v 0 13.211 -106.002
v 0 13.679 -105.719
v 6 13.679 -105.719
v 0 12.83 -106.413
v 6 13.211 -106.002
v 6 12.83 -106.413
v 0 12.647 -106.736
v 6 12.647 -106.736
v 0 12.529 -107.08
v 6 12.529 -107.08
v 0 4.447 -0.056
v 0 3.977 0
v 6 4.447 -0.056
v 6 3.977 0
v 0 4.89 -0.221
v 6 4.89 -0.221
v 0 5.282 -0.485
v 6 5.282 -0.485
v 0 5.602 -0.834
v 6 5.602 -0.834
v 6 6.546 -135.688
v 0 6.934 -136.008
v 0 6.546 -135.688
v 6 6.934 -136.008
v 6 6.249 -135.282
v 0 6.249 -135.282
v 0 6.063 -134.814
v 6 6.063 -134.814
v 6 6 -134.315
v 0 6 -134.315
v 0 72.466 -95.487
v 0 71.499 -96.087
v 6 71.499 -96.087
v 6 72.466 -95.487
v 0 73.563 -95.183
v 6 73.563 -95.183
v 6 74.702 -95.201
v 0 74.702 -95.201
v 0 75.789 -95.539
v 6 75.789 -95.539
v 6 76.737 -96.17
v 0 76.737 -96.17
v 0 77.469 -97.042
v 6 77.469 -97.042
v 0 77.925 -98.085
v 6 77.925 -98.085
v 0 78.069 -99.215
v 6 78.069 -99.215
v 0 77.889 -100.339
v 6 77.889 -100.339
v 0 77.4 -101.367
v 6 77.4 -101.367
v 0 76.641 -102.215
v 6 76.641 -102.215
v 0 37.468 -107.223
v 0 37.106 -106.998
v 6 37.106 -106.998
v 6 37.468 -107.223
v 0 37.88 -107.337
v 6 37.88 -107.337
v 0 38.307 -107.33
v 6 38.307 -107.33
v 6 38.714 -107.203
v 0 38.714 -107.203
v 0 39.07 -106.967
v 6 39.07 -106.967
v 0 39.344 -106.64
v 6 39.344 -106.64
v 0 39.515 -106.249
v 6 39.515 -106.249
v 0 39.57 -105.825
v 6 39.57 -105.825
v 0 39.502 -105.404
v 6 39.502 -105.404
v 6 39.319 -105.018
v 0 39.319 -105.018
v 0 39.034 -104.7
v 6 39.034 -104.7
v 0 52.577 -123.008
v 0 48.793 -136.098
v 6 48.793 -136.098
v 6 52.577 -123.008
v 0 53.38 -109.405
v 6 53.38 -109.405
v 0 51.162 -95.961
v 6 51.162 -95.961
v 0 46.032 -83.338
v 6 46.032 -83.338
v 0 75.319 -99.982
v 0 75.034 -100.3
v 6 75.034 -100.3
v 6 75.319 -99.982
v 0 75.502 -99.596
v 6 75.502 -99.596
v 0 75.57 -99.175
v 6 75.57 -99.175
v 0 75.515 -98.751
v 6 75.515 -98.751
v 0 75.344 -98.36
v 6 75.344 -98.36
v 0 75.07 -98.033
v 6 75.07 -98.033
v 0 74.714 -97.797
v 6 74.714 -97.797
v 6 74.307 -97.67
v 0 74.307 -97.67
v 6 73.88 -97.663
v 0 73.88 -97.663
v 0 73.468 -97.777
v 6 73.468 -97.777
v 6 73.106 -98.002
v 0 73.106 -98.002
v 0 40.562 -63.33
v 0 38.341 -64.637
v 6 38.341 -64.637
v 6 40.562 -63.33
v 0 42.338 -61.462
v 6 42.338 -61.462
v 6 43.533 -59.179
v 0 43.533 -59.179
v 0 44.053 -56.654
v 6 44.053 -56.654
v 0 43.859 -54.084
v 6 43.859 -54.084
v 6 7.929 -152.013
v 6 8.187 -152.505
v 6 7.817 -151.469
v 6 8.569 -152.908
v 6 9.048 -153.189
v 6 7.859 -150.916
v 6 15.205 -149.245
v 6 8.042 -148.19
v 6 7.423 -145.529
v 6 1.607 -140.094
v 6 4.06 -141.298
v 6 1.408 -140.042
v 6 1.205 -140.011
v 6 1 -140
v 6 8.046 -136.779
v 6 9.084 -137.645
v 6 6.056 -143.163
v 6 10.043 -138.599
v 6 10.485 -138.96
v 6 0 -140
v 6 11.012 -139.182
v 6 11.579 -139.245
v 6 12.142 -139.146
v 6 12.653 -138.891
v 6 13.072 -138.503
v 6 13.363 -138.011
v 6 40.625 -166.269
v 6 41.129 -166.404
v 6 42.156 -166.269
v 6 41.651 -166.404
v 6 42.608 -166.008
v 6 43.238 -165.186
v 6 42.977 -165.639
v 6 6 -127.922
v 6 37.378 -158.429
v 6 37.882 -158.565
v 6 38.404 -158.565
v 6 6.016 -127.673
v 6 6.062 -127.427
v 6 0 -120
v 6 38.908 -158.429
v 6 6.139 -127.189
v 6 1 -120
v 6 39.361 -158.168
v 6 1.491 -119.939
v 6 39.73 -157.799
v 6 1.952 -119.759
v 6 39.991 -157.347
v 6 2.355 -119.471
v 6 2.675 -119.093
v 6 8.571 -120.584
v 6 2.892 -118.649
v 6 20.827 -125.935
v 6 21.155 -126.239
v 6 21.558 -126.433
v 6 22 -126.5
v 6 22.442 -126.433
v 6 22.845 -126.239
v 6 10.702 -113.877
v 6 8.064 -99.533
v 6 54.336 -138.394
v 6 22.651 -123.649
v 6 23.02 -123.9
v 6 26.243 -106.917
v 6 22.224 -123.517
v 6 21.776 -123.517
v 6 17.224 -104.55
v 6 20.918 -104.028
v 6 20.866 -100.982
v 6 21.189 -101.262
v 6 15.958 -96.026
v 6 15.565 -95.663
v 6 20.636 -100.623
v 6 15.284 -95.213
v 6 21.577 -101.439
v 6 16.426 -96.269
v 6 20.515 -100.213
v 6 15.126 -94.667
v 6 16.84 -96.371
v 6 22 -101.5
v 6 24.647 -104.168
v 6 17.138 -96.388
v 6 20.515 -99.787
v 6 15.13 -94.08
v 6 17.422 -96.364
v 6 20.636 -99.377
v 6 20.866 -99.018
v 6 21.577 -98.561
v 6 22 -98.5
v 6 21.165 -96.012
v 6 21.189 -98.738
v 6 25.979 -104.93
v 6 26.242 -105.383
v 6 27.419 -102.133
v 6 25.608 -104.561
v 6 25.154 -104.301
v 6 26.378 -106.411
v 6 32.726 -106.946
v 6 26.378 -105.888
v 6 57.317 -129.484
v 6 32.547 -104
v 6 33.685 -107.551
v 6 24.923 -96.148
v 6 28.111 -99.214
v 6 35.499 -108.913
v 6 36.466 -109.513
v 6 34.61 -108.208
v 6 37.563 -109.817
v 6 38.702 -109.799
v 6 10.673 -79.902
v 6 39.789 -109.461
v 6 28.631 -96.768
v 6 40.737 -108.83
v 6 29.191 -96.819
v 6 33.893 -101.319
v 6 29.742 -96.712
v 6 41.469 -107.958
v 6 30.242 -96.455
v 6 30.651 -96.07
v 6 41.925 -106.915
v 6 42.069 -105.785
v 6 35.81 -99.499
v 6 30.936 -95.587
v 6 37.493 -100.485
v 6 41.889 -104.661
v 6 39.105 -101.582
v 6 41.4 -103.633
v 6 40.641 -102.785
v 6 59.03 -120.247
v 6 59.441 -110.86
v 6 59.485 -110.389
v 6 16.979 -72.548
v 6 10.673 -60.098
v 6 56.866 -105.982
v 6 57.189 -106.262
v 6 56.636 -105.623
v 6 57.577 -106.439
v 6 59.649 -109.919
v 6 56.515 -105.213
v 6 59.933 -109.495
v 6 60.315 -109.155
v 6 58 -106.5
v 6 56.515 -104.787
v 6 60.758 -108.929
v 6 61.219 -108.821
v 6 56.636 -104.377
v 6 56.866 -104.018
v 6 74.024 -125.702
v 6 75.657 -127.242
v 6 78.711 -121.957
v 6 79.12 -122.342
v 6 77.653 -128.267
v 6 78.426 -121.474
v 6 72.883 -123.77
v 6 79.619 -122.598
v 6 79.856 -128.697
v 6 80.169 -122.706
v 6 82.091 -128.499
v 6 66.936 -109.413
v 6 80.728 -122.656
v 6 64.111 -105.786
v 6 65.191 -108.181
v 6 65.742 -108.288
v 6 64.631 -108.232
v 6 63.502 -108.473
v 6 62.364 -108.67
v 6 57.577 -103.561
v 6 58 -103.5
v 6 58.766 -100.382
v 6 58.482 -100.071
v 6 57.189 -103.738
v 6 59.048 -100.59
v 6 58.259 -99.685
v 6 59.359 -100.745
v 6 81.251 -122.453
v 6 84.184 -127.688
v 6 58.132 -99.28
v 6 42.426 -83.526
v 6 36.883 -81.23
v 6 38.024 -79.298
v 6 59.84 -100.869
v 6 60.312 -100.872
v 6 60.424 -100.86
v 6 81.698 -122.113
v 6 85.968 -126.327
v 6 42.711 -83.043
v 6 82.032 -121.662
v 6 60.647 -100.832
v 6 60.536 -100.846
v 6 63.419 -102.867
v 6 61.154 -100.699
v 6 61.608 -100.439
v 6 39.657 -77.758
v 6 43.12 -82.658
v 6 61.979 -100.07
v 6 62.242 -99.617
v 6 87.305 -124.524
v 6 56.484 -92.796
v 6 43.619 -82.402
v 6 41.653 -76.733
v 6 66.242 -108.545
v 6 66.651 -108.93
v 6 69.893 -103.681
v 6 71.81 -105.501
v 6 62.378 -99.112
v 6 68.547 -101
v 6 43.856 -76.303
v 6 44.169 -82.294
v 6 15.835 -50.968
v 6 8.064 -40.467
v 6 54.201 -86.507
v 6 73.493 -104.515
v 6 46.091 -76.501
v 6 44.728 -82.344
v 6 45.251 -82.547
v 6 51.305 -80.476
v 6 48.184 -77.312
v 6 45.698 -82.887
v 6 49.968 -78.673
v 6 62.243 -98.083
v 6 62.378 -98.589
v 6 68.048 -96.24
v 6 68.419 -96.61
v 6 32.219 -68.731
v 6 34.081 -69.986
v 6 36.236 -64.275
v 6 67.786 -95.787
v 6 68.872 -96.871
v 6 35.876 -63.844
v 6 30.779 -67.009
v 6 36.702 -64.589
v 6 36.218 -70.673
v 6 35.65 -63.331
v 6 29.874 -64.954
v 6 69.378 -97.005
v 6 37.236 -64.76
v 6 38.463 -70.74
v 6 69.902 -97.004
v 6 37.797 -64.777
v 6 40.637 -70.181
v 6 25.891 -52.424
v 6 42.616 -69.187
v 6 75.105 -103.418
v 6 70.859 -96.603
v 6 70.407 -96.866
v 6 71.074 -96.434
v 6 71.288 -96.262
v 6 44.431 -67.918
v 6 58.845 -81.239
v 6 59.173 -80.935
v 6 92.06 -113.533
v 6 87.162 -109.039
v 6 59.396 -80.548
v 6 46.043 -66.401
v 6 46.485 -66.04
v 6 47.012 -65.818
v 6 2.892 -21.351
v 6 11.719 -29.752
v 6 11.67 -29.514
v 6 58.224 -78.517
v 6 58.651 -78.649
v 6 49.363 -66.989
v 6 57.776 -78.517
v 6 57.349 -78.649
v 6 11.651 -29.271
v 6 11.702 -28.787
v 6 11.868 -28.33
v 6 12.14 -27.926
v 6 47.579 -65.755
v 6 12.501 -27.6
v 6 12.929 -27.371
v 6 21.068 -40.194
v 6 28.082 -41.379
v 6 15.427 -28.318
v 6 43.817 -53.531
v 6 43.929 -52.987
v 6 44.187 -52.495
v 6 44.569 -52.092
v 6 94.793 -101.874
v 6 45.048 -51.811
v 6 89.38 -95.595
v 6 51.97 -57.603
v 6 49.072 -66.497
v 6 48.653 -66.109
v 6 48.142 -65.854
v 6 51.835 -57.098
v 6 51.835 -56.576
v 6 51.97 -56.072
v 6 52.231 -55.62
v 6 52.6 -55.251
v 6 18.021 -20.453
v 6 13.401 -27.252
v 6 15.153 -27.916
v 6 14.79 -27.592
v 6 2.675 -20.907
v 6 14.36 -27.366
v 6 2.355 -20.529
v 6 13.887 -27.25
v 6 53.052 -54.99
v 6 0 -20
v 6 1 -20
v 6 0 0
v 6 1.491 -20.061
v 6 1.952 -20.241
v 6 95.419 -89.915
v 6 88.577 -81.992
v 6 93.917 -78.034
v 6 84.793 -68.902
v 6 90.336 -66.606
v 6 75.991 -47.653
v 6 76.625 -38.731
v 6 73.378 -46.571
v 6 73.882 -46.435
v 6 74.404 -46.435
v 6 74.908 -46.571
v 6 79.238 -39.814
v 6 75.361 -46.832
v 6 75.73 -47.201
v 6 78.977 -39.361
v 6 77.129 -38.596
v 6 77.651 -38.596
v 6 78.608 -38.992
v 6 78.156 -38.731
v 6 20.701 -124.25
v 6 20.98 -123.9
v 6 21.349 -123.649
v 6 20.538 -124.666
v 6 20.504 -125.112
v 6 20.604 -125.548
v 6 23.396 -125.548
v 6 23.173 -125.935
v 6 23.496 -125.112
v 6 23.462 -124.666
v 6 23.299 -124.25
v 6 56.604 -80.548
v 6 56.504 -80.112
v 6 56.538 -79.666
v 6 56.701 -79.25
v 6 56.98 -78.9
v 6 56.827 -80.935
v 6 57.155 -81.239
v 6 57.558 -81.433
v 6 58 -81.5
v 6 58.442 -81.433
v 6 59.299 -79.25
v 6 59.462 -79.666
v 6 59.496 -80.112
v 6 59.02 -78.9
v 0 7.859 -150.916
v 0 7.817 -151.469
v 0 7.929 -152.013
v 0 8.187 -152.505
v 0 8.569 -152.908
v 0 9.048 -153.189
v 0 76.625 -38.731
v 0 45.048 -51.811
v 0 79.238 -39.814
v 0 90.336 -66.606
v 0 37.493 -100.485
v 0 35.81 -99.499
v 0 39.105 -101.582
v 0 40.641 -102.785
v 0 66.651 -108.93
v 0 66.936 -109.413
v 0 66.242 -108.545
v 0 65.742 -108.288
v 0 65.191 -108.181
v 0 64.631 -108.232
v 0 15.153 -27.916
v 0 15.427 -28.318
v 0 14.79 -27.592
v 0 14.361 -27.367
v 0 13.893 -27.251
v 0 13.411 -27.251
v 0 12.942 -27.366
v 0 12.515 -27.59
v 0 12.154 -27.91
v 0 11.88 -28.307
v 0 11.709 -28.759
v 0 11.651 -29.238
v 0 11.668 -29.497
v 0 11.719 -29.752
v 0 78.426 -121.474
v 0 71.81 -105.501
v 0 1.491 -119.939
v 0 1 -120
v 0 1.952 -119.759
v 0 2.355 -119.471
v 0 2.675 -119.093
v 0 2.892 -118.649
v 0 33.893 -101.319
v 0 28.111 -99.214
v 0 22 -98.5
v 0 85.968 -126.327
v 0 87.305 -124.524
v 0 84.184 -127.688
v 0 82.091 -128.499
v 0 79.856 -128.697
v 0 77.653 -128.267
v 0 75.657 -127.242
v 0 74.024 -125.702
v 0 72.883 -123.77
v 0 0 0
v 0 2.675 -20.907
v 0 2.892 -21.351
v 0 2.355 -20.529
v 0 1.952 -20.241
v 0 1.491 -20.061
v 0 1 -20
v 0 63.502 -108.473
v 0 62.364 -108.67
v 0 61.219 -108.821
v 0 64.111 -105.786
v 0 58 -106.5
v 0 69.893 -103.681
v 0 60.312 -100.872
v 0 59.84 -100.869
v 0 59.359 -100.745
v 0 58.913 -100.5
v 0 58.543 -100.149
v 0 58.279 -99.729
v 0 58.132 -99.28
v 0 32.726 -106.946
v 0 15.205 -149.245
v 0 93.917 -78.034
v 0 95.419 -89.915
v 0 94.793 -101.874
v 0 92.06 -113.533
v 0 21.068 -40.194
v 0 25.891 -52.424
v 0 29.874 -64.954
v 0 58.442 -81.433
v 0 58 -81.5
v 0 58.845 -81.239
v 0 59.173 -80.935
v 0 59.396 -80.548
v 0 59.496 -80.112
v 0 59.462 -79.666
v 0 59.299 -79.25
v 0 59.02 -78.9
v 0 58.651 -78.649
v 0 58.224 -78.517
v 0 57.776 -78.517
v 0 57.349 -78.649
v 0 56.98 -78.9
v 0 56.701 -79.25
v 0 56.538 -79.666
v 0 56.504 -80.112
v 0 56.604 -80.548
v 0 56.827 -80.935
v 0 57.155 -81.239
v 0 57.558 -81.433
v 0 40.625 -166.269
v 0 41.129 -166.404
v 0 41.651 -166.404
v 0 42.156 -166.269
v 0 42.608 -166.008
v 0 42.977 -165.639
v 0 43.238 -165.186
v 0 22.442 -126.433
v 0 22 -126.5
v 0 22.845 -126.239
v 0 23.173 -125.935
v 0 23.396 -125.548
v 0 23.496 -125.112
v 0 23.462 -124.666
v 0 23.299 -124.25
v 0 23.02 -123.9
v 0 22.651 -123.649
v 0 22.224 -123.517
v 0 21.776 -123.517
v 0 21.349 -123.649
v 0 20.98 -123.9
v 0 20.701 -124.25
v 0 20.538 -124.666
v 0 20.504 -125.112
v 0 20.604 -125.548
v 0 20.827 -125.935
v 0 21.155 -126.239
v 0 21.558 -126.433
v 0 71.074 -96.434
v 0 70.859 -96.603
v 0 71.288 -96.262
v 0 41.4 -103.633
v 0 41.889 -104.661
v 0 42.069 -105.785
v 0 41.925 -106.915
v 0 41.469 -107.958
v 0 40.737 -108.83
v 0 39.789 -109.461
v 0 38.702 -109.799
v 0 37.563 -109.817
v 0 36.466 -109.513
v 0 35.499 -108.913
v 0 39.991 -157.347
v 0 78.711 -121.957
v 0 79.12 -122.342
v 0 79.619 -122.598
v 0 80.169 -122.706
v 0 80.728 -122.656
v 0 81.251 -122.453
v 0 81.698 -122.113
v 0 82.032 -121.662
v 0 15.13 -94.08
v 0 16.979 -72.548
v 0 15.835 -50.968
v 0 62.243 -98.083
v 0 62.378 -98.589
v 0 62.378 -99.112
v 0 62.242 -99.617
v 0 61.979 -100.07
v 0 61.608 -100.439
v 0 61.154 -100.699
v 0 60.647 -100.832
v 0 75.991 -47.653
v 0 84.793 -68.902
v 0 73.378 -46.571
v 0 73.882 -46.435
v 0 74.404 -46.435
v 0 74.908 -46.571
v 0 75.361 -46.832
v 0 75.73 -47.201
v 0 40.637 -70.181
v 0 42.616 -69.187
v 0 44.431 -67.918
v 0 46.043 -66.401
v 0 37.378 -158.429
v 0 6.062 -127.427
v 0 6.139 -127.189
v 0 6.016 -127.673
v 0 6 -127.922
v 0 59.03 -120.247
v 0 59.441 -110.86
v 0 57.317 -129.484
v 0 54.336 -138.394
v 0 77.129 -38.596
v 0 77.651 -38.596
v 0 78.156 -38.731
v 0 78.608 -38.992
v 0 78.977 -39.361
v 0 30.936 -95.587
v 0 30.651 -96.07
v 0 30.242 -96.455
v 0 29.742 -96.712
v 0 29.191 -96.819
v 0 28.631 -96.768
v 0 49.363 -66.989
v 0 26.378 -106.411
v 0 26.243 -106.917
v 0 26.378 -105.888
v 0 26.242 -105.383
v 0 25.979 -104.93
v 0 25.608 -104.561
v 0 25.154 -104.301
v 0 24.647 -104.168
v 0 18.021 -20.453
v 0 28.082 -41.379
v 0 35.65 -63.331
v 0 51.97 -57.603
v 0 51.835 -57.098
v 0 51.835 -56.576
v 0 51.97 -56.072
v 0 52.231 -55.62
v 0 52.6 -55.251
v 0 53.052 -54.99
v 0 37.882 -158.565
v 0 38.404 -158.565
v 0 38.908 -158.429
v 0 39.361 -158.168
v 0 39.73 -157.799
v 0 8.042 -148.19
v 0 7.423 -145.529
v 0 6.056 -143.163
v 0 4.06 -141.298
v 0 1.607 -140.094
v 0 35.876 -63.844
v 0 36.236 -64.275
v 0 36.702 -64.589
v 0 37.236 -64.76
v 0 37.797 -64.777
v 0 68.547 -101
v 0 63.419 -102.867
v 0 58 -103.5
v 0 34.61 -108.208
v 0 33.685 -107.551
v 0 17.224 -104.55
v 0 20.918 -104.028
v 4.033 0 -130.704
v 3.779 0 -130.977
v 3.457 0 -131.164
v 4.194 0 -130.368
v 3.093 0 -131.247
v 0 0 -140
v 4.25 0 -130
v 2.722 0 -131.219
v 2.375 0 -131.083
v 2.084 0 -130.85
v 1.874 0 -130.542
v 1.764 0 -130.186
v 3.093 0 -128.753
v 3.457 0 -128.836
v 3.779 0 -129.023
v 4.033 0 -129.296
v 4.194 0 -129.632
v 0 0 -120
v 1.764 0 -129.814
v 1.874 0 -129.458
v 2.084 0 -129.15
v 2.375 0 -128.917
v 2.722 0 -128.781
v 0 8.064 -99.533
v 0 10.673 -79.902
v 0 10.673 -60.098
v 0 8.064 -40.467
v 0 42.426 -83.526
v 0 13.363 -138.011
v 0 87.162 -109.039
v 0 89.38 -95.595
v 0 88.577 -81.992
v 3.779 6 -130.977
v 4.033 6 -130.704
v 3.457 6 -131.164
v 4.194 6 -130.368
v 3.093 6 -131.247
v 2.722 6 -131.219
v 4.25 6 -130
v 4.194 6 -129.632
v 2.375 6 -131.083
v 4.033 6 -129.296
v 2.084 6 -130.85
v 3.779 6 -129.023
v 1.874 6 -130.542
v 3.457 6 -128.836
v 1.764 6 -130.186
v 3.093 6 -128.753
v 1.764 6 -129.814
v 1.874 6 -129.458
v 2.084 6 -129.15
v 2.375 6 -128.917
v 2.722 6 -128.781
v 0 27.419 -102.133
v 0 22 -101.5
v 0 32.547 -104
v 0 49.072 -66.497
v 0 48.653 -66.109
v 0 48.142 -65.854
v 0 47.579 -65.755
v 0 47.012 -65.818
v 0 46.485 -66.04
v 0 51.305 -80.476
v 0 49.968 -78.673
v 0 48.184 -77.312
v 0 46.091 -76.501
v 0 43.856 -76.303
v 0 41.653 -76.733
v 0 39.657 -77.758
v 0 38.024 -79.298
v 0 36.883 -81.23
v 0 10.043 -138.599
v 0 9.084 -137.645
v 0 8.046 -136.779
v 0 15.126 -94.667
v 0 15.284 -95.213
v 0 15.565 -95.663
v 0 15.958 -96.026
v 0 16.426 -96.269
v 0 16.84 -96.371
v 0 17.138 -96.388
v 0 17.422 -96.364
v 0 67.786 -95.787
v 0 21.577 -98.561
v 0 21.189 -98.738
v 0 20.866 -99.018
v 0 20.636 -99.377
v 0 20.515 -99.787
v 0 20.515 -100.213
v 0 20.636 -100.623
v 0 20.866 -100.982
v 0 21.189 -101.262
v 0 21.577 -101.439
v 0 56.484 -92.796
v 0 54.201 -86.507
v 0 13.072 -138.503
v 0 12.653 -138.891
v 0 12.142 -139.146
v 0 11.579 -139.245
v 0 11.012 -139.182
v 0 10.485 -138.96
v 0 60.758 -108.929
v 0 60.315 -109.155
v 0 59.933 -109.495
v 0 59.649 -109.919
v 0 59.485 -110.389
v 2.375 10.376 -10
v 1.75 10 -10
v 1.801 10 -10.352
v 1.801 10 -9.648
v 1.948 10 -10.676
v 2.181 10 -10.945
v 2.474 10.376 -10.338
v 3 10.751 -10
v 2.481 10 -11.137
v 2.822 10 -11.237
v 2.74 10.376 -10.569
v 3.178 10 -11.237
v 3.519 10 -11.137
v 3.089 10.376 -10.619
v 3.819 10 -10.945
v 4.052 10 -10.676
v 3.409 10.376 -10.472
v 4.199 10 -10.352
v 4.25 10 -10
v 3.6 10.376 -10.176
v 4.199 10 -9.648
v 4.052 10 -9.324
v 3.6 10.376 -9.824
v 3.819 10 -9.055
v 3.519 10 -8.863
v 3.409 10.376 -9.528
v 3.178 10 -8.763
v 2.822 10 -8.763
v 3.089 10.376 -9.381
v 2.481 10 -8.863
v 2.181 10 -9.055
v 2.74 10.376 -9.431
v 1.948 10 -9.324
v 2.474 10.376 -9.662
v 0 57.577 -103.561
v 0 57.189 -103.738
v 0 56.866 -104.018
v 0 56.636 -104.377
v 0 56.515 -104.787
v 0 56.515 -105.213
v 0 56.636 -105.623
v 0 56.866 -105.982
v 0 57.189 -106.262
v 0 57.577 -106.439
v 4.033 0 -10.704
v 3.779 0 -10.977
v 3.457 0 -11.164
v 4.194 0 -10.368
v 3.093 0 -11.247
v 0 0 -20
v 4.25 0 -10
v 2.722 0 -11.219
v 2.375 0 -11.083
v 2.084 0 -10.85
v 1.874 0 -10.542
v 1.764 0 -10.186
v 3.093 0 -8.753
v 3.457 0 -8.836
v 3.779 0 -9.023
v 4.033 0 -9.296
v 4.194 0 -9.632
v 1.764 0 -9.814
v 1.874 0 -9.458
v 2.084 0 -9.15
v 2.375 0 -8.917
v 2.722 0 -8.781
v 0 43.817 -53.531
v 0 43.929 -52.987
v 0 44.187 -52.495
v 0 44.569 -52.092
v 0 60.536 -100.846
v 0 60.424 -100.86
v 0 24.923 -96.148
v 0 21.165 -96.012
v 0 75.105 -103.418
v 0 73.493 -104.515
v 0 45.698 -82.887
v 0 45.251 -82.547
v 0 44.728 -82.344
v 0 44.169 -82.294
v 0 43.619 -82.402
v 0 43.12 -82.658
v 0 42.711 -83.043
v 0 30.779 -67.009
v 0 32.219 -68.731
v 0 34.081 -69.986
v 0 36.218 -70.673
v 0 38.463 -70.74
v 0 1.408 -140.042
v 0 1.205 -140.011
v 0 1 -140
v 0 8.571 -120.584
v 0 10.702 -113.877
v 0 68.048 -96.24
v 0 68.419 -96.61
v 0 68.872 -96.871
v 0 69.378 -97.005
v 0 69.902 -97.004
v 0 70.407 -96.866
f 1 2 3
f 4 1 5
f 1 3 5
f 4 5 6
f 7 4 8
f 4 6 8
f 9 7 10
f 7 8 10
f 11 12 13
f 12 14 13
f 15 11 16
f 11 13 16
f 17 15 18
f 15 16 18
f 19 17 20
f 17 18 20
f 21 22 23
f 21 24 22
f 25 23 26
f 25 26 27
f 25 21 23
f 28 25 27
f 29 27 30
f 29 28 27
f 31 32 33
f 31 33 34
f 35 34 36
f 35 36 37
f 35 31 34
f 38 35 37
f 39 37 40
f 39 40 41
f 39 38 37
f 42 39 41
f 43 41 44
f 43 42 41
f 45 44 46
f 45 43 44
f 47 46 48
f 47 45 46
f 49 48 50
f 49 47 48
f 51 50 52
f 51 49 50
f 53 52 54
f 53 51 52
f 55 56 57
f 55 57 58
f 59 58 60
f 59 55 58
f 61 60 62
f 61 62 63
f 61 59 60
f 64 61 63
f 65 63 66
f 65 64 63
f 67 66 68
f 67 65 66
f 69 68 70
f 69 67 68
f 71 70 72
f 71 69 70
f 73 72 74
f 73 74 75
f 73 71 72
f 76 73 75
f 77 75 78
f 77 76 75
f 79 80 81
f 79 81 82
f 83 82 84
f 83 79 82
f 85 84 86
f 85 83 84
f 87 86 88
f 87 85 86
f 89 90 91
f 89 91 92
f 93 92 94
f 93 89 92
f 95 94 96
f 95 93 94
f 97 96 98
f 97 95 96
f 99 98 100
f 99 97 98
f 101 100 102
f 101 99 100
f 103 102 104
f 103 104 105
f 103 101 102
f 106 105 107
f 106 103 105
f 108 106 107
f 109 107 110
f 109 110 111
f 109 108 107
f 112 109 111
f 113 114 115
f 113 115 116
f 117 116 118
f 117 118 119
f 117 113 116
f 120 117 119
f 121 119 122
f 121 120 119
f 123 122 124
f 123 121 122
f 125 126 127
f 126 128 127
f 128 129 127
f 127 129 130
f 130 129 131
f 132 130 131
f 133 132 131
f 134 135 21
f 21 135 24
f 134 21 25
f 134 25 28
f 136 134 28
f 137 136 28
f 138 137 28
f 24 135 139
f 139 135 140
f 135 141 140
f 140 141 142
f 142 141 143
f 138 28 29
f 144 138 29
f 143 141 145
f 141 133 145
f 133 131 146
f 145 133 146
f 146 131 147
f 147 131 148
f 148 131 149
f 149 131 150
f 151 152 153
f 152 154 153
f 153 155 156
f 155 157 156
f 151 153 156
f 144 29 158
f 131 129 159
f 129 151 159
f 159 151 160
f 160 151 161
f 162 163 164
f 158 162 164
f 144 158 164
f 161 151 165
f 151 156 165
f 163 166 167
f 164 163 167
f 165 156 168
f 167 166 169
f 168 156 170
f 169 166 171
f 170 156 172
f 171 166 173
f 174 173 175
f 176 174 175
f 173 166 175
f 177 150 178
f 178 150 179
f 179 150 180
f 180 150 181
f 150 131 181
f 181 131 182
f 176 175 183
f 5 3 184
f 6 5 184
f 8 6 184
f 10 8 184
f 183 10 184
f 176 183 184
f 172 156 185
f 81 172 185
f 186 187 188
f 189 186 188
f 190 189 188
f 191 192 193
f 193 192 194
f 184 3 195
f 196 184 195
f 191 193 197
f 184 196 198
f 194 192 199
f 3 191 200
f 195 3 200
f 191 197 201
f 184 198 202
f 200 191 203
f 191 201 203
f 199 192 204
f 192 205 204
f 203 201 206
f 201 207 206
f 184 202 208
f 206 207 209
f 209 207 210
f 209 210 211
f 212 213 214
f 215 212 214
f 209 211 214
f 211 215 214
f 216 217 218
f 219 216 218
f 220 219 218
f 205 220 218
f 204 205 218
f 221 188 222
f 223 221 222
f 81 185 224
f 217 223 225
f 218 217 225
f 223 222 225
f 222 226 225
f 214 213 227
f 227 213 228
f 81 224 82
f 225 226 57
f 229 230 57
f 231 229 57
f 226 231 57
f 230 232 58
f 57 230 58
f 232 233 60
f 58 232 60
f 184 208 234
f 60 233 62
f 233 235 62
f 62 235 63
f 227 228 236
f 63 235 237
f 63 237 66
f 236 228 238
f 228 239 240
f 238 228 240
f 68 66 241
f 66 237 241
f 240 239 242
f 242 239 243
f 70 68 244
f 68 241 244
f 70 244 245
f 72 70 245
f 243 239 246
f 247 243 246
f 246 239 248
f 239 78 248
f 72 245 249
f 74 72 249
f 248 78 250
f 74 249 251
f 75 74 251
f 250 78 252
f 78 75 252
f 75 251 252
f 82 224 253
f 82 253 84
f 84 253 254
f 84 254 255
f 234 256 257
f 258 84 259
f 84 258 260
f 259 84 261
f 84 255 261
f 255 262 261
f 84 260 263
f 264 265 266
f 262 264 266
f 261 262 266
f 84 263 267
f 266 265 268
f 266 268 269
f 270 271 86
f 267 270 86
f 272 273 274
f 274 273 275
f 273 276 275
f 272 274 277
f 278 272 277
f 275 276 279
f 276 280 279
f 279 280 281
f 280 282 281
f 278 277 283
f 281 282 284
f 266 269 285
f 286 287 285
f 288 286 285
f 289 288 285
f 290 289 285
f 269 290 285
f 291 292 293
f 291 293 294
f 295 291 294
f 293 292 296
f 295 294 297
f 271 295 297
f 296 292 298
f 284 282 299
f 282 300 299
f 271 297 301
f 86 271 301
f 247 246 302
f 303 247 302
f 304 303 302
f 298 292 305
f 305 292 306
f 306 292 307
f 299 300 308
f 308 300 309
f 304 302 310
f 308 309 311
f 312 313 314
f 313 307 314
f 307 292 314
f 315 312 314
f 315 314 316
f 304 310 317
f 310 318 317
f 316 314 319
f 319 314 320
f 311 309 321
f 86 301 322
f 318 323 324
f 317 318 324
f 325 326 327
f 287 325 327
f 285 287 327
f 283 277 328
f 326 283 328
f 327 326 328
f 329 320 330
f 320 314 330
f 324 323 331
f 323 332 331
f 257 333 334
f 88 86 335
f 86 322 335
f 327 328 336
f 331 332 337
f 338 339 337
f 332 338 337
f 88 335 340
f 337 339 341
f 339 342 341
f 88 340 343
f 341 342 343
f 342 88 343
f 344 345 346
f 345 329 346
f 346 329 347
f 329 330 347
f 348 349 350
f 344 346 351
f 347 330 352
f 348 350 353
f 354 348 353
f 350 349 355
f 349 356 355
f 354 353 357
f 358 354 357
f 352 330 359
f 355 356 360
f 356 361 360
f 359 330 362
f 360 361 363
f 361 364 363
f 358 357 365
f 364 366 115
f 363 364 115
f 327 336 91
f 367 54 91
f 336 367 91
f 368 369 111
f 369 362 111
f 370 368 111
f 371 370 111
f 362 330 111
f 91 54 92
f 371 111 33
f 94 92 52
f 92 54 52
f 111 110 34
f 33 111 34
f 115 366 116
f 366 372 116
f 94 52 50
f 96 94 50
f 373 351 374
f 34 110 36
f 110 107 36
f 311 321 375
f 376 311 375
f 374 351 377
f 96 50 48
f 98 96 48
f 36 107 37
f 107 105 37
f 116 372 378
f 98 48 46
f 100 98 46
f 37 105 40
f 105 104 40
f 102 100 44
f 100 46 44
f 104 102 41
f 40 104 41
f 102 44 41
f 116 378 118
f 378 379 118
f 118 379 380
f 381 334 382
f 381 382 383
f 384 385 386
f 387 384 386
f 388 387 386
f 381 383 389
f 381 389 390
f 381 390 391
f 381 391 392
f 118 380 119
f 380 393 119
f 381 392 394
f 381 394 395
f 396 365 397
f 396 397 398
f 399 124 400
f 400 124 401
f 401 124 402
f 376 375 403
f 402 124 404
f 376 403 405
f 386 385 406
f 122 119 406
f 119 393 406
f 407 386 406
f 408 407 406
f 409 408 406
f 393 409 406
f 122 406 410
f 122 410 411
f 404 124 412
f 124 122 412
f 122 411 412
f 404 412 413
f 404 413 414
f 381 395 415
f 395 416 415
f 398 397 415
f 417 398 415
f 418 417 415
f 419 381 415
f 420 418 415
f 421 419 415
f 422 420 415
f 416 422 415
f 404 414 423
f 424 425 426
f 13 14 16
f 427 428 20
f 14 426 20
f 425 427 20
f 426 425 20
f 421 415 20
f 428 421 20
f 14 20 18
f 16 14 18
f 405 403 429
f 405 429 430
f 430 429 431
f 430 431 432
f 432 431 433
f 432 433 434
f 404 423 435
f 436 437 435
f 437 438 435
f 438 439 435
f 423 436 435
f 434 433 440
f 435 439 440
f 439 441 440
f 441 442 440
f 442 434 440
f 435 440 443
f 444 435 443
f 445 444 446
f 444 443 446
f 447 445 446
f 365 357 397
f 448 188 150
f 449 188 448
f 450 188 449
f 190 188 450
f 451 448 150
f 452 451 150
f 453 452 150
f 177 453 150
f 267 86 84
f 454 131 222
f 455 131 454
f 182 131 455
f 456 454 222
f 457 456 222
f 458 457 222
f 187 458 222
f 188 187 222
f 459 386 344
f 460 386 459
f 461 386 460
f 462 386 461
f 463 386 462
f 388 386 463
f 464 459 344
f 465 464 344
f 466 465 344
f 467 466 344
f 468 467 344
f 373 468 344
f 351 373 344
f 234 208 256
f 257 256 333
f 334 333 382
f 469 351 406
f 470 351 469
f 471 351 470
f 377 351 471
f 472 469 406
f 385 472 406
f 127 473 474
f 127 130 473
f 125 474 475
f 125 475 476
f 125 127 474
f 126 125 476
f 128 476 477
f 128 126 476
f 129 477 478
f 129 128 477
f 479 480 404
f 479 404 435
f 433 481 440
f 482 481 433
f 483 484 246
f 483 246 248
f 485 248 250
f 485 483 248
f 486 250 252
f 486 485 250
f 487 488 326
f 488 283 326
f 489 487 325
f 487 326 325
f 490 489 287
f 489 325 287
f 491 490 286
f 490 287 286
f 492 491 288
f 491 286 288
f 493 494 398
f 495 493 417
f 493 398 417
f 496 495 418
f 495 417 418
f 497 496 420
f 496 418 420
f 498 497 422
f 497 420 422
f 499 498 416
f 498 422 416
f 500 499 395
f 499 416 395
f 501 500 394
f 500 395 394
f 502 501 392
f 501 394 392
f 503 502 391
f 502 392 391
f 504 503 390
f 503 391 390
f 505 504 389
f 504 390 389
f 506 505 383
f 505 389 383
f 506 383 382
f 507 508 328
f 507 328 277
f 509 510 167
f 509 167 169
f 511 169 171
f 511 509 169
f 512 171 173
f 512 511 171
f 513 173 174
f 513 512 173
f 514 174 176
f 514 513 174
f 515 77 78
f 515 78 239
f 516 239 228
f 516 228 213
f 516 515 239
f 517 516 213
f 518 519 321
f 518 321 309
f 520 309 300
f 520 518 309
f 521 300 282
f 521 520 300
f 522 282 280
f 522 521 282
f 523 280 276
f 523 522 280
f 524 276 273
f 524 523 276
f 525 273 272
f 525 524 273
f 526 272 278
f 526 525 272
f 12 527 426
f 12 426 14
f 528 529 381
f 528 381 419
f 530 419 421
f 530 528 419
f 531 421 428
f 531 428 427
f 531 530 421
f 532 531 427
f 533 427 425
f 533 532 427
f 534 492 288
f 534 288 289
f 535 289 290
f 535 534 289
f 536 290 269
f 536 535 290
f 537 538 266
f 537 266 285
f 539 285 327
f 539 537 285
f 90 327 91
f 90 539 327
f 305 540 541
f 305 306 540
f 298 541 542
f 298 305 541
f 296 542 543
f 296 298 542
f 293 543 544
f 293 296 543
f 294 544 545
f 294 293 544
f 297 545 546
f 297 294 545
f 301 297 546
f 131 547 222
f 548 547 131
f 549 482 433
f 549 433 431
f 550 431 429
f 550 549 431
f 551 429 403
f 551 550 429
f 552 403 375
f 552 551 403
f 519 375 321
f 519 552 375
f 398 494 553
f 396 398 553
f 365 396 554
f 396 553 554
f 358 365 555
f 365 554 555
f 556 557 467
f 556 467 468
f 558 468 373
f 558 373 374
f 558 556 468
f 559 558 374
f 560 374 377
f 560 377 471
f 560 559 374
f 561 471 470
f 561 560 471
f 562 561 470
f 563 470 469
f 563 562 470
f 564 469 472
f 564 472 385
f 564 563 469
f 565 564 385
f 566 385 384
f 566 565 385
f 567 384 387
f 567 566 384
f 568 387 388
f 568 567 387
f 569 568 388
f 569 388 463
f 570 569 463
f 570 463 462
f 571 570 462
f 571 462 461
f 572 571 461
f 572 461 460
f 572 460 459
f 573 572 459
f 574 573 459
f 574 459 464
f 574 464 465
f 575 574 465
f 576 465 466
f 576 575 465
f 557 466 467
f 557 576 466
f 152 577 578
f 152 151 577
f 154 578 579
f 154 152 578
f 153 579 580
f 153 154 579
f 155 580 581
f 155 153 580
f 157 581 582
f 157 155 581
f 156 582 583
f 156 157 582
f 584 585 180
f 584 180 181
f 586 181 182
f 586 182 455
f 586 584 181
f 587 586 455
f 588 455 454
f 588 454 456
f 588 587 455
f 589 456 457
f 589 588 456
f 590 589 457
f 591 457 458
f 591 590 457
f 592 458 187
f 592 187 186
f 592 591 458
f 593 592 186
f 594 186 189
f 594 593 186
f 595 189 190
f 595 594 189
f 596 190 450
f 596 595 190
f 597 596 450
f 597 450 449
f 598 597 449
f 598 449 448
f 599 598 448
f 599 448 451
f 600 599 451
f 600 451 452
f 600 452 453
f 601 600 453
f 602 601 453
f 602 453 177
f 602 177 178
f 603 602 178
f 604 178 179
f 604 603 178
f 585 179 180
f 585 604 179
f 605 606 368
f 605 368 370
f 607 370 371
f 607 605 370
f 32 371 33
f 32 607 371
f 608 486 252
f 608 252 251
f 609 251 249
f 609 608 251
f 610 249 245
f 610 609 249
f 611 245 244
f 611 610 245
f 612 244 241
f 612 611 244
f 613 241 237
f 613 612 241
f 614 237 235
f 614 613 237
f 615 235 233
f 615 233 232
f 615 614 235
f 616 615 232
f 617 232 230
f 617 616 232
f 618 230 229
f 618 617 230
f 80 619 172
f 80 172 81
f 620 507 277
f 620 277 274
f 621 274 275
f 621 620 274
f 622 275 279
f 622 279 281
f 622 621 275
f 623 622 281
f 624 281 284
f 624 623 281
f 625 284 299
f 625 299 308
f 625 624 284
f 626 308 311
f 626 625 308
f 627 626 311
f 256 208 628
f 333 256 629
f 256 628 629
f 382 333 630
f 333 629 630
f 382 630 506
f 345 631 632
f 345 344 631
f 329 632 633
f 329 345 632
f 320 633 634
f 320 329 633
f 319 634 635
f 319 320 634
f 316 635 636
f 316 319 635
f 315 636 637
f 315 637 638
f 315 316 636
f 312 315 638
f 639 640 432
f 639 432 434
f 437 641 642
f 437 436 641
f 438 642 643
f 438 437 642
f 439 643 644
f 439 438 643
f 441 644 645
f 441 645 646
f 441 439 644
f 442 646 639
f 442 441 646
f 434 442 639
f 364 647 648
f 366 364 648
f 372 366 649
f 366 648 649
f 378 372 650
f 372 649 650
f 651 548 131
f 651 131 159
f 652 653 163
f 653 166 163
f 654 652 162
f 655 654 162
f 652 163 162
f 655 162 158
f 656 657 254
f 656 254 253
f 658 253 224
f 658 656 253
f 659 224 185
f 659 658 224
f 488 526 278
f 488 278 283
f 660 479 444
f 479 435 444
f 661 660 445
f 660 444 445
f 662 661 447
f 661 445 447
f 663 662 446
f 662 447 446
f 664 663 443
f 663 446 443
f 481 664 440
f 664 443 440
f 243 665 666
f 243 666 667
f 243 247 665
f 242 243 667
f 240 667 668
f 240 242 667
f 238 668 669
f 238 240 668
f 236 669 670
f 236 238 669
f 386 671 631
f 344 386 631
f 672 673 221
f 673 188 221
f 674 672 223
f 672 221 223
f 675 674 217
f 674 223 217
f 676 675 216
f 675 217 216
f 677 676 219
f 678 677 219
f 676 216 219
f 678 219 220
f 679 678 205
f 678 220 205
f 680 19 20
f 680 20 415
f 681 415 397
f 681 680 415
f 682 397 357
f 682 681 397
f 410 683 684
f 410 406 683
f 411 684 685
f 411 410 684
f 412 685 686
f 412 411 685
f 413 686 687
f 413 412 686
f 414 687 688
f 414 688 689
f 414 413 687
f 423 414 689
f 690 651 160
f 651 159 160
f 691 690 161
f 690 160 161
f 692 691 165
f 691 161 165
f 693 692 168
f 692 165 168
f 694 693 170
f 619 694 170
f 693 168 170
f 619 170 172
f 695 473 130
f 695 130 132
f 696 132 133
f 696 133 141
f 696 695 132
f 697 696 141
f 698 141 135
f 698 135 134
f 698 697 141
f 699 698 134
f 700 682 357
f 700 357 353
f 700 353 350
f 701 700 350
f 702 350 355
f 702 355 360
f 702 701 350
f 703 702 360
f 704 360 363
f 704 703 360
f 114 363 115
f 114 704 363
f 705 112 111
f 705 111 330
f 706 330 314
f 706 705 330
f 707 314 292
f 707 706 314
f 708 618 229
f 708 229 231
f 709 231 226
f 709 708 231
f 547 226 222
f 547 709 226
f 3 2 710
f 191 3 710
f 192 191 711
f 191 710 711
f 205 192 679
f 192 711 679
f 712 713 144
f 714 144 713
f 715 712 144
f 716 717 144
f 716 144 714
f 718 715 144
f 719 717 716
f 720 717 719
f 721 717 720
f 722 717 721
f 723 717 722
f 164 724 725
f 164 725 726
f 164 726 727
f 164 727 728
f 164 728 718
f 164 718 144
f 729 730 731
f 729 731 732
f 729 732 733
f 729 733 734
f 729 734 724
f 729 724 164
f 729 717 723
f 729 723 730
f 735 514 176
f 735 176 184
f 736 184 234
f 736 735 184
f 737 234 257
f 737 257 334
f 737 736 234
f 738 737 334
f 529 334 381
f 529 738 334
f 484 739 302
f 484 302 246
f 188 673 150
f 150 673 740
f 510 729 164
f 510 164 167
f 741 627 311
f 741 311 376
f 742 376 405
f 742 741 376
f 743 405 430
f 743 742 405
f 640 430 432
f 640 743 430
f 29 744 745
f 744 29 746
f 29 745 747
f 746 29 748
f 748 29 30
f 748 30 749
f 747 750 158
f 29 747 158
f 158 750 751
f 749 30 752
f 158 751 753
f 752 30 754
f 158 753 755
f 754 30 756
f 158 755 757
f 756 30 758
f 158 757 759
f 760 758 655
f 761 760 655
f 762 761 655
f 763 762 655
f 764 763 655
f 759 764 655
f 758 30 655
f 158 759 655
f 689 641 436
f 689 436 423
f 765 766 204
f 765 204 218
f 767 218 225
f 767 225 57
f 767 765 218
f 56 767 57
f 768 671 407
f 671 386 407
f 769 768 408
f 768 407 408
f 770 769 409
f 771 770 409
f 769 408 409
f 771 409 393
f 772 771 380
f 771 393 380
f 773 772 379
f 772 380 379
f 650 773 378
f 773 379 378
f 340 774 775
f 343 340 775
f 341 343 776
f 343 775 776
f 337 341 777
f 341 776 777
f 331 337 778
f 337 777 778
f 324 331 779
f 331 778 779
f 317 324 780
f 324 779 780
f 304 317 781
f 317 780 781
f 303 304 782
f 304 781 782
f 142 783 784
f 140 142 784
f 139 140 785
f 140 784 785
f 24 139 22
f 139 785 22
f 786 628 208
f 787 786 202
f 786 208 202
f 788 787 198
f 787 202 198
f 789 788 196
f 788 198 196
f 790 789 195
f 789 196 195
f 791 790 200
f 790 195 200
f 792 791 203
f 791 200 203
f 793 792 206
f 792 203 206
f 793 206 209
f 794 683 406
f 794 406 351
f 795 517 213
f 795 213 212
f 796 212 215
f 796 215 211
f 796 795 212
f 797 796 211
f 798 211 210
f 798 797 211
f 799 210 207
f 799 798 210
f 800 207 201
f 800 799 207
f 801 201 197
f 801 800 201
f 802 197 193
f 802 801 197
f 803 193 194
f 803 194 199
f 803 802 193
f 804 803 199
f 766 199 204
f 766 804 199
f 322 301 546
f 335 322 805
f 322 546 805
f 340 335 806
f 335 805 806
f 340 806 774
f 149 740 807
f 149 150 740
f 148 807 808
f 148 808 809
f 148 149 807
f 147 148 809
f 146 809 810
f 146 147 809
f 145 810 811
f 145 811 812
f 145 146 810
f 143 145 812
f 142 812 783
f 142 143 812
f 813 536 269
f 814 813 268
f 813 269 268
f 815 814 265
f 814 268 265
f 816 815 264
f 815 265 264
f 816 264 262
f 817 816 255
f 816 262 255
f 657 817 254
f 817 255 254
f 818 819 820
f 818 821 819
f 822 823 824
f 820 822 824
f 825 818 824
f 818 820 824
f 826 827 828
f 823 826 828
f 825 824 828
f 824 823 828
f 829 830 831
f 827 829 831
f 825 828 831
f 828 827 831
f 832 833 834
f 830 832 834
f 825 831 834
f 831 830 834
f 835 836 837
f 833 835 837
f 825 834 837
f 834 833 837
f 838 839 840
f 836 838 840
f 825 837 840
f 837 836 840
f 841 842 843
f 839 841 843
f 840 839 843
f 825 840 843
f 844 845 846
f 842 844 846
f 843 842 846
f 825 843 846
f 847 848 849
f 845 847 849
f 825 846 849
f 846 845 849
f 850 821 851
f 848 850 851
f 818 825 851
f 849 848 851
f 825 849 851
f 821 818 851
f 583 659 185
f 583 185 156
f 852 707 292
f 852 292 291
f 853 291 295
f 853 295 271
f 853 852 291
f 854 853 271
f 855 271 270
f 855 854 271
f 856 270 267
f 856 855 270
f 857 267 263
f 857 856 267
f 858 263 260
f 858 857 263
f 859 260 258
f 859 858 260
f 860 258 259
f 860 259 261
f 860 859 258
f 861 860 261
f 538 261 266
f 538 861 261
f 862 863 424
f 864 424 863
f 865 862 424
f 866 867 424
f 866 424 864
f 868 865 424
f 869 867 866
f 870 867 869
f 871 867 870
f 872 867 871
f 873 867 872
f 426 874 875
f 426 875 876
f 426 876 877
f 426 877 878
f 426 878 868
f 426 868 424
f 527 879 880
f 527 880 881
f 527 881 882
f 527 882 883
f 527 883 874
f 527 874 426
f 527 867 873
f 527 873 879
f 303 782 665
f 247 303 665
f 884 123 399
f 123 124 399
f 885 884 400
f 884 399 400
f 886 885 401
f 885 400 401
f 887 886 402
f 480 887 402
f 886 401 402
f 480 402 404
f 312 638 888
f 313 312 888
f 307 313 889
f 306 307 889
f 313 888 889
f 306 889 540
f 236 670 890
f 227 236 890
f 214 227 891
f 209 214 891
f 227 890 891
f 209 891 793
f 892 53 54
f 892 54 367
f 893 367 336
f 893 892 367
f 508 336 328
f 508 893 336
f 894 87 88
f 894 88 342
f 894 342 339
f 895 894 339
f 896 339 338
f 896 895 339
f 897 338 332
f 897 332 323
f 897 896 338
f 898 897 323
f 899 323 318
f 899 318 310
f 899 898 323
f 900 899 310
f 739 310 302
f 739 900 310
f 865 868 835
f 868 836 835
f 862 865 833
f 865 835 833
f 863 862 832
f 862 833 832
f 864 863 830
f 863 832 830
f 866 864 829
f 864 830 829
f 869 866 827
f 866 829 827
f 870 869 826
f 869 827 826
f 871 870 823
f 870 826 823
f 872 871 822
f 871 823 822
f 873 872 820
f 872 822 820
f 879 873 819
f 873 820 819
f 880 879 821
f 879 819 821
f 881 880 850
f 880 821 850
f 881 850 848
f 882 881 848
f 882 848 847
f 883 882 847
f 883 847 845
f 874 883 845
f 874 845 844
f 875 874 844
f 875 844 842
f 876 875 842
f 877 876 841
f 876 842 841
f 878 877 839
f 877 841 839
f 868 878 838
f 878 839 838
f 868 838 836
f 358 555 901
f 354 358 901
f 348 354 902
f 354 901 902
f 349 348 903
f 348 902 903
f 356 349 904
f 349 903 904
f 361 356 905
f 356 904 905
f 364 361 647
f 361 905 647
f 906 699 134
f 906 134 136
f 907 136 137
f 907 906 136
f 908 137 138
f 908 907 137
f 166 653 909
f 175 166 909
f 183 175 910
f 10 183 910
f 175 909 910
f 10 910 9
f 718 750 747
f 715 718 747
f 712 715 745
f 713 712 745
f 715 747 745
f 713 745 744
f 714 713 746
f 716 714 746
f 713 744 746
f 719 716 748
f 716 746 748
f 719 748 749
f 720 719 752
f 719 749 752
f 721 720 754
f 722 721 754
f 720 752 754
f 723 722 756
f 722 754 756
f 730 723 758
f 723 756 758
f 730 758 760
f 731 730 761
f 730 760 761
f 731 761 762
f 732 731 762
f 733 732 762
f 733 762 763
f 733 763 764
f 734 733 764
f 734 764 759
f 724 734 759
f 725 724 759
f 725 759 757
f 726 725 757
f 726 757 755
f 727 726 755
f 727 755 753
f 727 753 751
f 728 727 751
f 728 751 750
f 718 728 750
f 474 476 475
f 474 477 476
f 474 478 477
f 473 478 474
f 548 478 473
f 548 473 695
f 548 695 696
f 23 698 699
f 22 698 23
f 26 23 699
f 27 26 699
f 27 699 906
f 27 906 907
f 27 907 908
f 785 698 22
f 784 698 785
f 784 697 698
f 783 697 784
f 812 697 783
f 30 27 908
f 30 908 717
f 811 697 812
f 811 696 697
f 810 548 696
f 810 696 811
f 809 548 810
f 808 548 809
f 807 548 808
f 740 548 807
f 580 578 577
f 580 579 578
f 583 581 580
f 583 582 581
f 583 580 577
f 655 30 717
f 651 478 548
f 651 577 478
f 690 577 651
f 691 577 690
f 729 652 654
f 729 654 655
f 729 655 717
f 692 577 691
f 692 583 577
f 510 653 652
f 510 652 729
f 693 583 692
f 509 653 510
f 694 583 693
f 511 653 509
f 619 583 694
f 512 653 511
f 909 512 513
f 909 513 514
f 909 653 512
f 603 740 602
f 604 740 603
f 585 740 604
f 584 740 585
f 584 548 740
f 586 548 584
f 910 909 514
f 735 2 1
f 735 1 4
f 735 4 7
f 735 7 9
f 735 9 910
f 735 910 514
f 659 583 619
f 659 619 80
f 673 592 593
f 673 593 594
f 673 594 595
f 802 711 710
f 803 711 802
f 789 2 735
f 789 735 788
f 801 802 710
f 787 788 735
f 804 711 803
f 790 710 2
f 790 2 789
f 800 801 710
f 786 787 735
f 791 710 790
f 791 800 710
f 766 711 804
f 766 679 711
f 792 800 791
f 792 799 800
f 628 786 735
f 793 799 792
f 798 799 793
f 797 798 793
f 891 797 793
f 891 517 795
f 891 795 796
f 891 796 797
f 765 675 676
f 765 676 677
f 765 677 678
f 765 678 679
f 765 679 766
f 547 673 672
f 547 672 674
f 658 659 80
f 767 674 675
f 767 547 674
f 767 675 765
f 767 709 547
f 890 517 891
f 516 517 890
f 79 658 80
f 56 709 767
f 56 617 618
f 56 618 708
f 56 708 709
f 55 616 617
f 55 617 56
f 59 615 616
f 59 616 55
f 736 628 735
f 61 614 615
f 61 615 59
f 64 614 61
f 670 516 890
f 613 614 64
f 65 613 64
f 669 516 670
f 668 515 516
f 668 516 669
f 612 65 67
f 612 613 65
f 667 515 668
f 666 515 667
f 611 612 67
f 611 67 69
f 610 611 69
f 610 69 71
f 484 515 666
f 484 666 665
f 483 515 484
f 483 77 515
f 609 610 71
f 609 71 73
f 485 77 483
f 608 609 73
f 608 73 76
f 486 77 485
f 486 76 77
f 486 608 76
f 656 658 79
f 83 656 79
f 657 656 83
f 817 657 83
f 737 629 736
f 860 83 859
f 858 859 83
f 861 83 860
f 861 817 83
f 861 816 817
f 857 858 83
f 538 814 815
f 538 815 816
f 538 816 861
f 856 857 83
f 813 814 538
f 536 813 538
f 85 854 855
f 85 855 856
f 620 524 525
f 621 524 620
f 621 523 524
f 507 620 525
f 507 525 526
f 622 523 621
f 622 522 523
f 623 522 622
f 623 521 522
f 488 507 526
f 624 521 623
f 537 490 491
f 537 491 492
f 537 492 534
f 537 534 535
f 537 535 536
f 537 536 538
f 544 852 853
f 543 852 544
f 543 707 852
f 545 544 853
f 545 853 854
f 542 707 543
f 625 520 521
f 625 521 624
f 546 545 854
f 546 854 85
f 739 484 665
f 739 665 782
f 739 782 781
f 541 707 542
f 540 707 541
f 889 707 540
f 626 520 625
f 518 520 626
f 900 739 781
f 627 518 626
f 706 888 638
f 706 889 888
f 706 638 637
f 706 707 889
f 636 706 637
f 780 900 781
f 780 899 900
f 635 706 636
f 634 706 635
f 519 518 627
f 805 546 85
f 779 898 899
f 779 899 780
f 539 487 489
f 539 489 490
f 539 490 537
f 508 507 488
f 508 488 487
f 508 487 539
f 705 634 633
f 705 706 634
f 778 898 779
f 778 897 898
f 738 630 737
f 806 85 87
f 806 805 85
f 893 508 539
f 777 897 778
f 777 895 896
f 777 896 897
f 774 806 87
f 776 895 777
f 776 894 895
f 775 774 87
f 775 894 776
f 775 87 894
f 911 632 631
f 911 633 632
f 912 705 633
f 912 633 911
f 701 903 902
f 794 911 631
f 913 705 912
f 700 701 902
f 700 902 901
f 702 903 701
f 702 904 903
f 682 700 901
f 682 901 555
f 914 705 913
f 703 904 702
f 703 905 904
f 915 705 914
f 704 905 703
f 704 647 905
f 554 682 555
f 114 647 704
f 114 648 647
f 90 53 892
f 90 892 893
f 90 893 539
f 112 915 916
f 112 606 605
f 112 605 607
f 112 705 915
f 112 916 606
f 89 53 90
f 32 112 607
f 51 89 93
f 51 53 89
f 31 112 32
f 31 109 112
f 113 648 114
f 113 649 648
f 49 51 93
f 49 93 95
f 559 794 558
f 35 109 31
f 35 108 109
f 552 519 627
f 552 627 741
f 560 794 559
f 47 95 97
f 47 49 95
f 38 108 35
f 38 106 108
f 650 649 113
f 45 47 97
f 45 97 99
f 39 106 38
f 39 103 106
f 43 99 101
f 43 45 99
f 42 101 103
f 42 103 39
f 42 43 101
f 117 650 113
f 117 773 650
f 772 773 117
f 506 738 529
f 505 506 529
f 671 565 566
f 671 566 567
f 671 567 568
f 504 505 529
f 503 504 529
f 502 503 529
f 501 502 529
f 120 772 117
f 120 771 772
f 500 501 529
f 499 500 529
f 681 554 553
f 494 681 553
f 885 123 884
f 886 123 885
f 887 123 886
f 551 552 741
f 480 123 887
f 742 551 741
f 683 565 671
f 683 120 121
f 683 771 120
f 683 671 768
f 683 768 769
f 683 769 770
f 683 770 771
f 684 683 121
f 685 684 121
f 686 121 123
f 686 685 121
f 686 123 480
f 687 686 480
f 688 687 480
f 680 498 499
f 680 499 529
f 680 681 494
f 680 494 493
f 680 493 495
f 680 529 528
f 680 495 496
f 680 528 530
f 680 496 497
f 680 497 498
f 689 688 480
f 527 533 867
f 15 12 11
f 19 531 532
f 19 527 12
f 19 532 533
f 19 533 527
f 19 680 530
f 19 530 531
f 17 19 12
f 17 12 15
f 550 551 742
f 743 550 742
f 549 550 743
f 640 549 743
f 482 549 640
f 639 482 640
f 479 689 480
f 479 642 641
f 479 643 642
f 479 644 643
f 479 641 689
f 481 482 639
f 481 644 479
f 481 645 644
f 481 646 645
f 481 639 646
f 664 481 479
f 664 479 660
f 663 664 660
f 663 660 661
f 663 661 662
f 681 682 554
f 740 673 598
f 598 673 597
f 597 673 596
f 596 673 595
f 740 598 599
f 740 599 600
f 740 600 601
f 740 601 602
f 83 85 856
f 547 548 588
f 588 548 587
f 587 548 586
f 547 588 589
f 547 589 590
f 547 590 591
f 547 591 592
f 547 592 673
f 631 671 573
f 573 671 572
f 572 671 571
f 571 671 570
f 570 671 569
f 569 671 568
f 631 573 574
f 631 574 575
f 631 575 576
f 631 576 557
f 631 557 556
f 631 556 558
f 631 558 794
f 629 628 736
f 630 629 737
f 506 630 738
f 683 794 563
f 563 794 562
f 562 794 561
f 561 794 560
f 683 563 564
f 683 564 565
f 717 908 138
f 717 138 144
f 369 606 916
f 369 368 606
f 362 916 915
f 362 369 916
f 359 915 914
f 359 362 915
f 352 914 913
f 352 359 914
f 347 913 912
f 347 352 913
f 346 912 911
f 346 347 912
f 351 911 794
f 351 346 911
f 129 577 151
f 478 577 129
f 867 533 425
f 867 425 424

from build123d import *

# Parameters (mm, degrees)
SKETCH1_R                   = 1.5
BOSS_EXTRUDE1_DEPTH         = 6
FILLET1_R                   = 2
TAP_DRILL_FOR_M3_TAP1_D     = 2.5
TAP_DRILL_FOR_M3_TAP1_DEPTH = 10
TAP_DRILL_FOR_M3_TAP1_TIP   = 0.751075774


with BuildPart() as part:
    # Sketch1 → Boss-Extrude1 (new body)
    with BuildSketch(Plane(origin=(0, 0, 0), x_dir=(0, 0, -1), z_dir=(1, 0, 0))):
        with BuildLine():
            Line((0, 0), (0, 5))
            ThreePointArc((0, 5), (30.306872644, 23.131839172), (63.330515184, 35.650191885))
            ThreePointArc((63.330515184, 35.650191885), (64.588559877, 36.701940492), (64.63724154, 38.340989509))
            ThreePointArc((64.63724154, 38.340989509), (59.61305605, 43.365174999), (52.507784789, 43.365174999))
            Line((52.507784789, 43.365174999), (37.965814359, 78.472597235))
            Line((37.965814359, 78.472597235), (66.606079867, 90.335783638))
            ThreePointArc((66.606079867, 90.335783638), (95.908082664, 95.371985071), (124.52441978, 87.305018919))
            ThreePointArc((124.52441978, 87.305018919), (128.697334576, 79.855822577), (123.769732571, 72.882840251))
            Line((123.769732571, 72.882840251), (107.796810512, 66.266639304))
            ThreePointArc((107.796810512, 66.266639304), (108.591313984, 62.851470364), (108.967839824, 59.365377574))
            ThreePointArc((108.967839824, 59.365377574), (123.962972186, 58.5009858), (138.393920133, 54.335783638))
            Line((138.393920133, 54.335783638), (167.034185641, 42.472597235))
            Line((167.034185641, 42.472597235), (152.492215211, 7.365174999))
            ThreePointArc((152.492215211, 7.365174999), (145.029217261, 7.208101321), (140.094434117, 1.607304426))
            ThreePointArc((140.094434117, 1.607304426), (140.023749539, 1.307301346), (140, 1))
            Line((140, 1), (140, 0))
            Line((140, 0), (120, 0))
            Line((120, 0), (120, 1))
            ThreePointArc((120, 1), (119.627466942, 2.162476387), (118.648648649, 2.891891892))
            ThreePointArc((118.648648649, 2.891891892), (70, 11), (21.351351351, 2.891891892))
            ThreePointArc((21.351351351, 2.891891892), (20.372533058, 2.162476387), (20, 1))
            Line((20, 1), (20, 0))
            Line((20, 0), (0, 0))
        make_face()
        with Locations((80, 58)):
            Circle(SKETCH1_R, mode=Mode.SUBTRACT)
        with Locations((125, 22)):
            Circle(SKETCH1_R, mode=Mode.SUBTRACT)
        with BuildLine():
            Line((105.500709917, 71.809916499), (121.473631977, 78.426117447))
            ThreePointArc((121.473631977, 78.426117447), (122.705532478, 80.169363028), (121.662303779, 82.031662113))
            ThreePointArc((121.662303779, 82.031662113), (95.594542214, 89.380182973), (68.902180461, 84.792506443))
            Line((68.902180461, 84.792506443), (45.805192149, 75.225420634))
            Line((45.805192149, 75.225420634), (55.75496139, 51.204552788))
            Line((55.75496139, 51.204552788), (98.054425187, 68.725564374))
            ThreePointArc((98.054425187, 68.725564374), (97.126892249, 70.151936549), (96.086933305, 71.498539803))
            ThreePointArc((96.086933305, 71.498539803), (96.579960639, 77.133868015), (102.21528885, 76.640840681))
            ThreePointArc((102.21528885, 76.640840681), (103.979962296, 74.308323282), (105.500709917, 71.809916499))
        make_face(mode=Mode.SUBTRACT)
        with BuildLine():
            Line((63.72452745, 48.011301935), (100.350525782, 63.182287179))
            ThreePointArc((100.350525782, 63.182287179), (100.807496311, 60.83691686), (100.995074214, 58.454817254))
            ThreePointArc((100.995074214, 58.454817254), (90.445167867, 55.712658084), (80.47558022, 51.305018919))
            ThreePointArc((80.47558022, 51.305018919), (76.302665424, 43.855822577), (81.230267429, 36.882840251))
            Line((81.230267429, 36.882840251), (97.203189488, 30.266639304))
            ThreePointArc((97.203189488, 30.266639304), (96.003949868, 22.478619602), (96.9455023, 14.655263189))
            ThreePointArc((96.9455023, 14.655263189), (53.555187376, 16.130809763), (11.438572835, 5.591006803))
            ThreePointArc((11.438572835, 5.591006803), (37.27128416, 19.770562369), (64.953613309, 29.873899607))
            ThreePointArc((64.953613309, 29.873899607), (69.985792082, 34.080894036), (70.180518735, 40.637090103))
            ThreePointArc((70.180518735, 40.637090103), (67.559666076, 44.855738901), (63.72452745, 48.011301935))
        make_face(mode=Mode.SUBTRACT)
        with BuildLine():
            Line((106.945574813, 32.725564374), (149.24503861, 15.204552788))
            Line((149.24503861, 15.204552788), (159.194807851, 39.225420634))
            Line((159.194807851, 39.225420634), (136.097819539, 48.792506443))
            ThreePointArc((136.097819539, 48.792506443), (109.405457786, 53.380182973), (83.337696221, 46.031662113))
            ThreePointArc((83.337696221, 46.031662113), (82.294467522, 44.169363028), (83.526368023, 42.426117447))
            Line((83.526368023, 42.426117447), (99.499290083, 35.809916499))
            ThreePointArc((99.499290083, 35.809916499), (101.020037704, 38.308323282), (102.78471115, 40.640840681))
            ThreePointArc((102.78471115, 40.640840681), (108.420039361, 41.133868015), (108.913066695, 35.498539803))
            ThreePointArc((108.913066695, 35.498539803), (107.873107751, 34.151936549), (106.945574813, 32.725564374))
        make_face(mode=Mode.SUBTRACT)
        with BuildLine():
            Line((104.649474218, 27.182287179), (141.27547255, 12.011301935))
            ThreePointArc((141.27547255, 12.011301935), (137.950950961, 9.410732752), (135.464526627, 6))
            Line((135.464526627, 6), (127.541289523, 6))
            ThreePointArc((127.541289523, 6), (116.964502802, 9.762681734), (106.144506127, 12.754982379))
            ThreePointArc((106.144506127, 12.754982379), (104.111850842, 19.835461998), (104.649474218, 27.182287179))
        make_face(mode=Mode.SUBTRACT)
        with BuildLine():
            ThreePointArc((106.5, 58), (104.901854451, 67.063533798), (100.300177743, 75.033871657))
            ThreePointArc((100.300177743, 75.033871657), (98.186929663, 75.218756907), (98.002044413, 73.105508828))
            ThreePointArc((98.002044413, 73.105508828), (102.082776588, 66.037473368), (103.5, 58))
            ThreePointArc((103.5, 58), (105, 56.5), (106.5, 58))
        make_face(mode=Mode.SUBTRACT)
        with BuildLine():
            ThreePointArc((104.699822257, 39.033871657), (100.098145549, 31.063533798), (98.5, 22))
            ThreePointArc((98.5, 22), (100, 20.5), (101.5, 22))
            ThreePointArc((101.5, 22), (102.917223412, 30.037473368), (106.997955587, 37.105508828))
            ThreePointArc((106.997955587, 37.105508828), (106.813070337, 39.218756907), (104.699822257, 39.033871657))
        make_face(mode=Mode.SUBTRACT)
    extrude(amount=BOSS_EXTRUDE1_DEPTH)

    # Fillet1
    fillet1_edges = [part.edges().sort_by_distance(p)[0] for p in [
        (3, 75.225420634, -45.805192149),
        (3, 51.204552788, -55.75496139),
        (3, 68.725564374, -98.054425187),
        (3, 58.454817254, -100.995074214),
        (3, 63.182287179, -100.350525782),
        (3, 48.011301935, -63.72452745),
        (3, 5.591006803, -11.438572835),
        (3, 14.655263189, -96.9455023),
        (3, 30.266639304, -97.203189488),
        (3, 27.182287179, -104.649474218),
        (3, 12.754982379, -106.144506127),
        (3, 6, -127.541289523),
        (3, 6, -135.464526627),
        (3, 12.011301935, -141.27547255),
        (3, 5, 0),
        (3, 43.365174999, -52.507784789),
        (3, 78.472597235, -37.965814359),
        (3, 66.266639304, -107.796810512),
        (3, 59.365377574, -108.967839824),
        (3, 42.472597235, -167.034185641),
        (3, 7.365174999, -152.492215211),
        (3, 39.225420634, -159.194807851),
    ]]
    fillet(fillet1_edges, radius=FILLET1_R)

    # Tap Drill for M3 Tap1
    with Locations(Plane(origin=(0, 0, 0), x_dir=(-1, 0, 0), z_dir=(0, -1, 0))):
        with Locations((-3, 10), (-3, 130)):
            Hole(TAP_DRILL_FOR_M3_TAP1_D / 2, depth=TAP_DRILL_FOR_M3_TAP1_DEPTH)
            with Locations((0, 0, -(TAP_DRILL_FOR_M3_TAP1_DEPTH + TAP_DRILL_FOR_M3_TAP1_TIP / 2))):  # 118° drill point
                Cone(0, TAP_DRILL_FOR_M3_TAP1_D / 2, TAP_DRILL_FOR_M3_TAP1_TIP, mode=Mode.SUBTRACT)


solid = part.part
